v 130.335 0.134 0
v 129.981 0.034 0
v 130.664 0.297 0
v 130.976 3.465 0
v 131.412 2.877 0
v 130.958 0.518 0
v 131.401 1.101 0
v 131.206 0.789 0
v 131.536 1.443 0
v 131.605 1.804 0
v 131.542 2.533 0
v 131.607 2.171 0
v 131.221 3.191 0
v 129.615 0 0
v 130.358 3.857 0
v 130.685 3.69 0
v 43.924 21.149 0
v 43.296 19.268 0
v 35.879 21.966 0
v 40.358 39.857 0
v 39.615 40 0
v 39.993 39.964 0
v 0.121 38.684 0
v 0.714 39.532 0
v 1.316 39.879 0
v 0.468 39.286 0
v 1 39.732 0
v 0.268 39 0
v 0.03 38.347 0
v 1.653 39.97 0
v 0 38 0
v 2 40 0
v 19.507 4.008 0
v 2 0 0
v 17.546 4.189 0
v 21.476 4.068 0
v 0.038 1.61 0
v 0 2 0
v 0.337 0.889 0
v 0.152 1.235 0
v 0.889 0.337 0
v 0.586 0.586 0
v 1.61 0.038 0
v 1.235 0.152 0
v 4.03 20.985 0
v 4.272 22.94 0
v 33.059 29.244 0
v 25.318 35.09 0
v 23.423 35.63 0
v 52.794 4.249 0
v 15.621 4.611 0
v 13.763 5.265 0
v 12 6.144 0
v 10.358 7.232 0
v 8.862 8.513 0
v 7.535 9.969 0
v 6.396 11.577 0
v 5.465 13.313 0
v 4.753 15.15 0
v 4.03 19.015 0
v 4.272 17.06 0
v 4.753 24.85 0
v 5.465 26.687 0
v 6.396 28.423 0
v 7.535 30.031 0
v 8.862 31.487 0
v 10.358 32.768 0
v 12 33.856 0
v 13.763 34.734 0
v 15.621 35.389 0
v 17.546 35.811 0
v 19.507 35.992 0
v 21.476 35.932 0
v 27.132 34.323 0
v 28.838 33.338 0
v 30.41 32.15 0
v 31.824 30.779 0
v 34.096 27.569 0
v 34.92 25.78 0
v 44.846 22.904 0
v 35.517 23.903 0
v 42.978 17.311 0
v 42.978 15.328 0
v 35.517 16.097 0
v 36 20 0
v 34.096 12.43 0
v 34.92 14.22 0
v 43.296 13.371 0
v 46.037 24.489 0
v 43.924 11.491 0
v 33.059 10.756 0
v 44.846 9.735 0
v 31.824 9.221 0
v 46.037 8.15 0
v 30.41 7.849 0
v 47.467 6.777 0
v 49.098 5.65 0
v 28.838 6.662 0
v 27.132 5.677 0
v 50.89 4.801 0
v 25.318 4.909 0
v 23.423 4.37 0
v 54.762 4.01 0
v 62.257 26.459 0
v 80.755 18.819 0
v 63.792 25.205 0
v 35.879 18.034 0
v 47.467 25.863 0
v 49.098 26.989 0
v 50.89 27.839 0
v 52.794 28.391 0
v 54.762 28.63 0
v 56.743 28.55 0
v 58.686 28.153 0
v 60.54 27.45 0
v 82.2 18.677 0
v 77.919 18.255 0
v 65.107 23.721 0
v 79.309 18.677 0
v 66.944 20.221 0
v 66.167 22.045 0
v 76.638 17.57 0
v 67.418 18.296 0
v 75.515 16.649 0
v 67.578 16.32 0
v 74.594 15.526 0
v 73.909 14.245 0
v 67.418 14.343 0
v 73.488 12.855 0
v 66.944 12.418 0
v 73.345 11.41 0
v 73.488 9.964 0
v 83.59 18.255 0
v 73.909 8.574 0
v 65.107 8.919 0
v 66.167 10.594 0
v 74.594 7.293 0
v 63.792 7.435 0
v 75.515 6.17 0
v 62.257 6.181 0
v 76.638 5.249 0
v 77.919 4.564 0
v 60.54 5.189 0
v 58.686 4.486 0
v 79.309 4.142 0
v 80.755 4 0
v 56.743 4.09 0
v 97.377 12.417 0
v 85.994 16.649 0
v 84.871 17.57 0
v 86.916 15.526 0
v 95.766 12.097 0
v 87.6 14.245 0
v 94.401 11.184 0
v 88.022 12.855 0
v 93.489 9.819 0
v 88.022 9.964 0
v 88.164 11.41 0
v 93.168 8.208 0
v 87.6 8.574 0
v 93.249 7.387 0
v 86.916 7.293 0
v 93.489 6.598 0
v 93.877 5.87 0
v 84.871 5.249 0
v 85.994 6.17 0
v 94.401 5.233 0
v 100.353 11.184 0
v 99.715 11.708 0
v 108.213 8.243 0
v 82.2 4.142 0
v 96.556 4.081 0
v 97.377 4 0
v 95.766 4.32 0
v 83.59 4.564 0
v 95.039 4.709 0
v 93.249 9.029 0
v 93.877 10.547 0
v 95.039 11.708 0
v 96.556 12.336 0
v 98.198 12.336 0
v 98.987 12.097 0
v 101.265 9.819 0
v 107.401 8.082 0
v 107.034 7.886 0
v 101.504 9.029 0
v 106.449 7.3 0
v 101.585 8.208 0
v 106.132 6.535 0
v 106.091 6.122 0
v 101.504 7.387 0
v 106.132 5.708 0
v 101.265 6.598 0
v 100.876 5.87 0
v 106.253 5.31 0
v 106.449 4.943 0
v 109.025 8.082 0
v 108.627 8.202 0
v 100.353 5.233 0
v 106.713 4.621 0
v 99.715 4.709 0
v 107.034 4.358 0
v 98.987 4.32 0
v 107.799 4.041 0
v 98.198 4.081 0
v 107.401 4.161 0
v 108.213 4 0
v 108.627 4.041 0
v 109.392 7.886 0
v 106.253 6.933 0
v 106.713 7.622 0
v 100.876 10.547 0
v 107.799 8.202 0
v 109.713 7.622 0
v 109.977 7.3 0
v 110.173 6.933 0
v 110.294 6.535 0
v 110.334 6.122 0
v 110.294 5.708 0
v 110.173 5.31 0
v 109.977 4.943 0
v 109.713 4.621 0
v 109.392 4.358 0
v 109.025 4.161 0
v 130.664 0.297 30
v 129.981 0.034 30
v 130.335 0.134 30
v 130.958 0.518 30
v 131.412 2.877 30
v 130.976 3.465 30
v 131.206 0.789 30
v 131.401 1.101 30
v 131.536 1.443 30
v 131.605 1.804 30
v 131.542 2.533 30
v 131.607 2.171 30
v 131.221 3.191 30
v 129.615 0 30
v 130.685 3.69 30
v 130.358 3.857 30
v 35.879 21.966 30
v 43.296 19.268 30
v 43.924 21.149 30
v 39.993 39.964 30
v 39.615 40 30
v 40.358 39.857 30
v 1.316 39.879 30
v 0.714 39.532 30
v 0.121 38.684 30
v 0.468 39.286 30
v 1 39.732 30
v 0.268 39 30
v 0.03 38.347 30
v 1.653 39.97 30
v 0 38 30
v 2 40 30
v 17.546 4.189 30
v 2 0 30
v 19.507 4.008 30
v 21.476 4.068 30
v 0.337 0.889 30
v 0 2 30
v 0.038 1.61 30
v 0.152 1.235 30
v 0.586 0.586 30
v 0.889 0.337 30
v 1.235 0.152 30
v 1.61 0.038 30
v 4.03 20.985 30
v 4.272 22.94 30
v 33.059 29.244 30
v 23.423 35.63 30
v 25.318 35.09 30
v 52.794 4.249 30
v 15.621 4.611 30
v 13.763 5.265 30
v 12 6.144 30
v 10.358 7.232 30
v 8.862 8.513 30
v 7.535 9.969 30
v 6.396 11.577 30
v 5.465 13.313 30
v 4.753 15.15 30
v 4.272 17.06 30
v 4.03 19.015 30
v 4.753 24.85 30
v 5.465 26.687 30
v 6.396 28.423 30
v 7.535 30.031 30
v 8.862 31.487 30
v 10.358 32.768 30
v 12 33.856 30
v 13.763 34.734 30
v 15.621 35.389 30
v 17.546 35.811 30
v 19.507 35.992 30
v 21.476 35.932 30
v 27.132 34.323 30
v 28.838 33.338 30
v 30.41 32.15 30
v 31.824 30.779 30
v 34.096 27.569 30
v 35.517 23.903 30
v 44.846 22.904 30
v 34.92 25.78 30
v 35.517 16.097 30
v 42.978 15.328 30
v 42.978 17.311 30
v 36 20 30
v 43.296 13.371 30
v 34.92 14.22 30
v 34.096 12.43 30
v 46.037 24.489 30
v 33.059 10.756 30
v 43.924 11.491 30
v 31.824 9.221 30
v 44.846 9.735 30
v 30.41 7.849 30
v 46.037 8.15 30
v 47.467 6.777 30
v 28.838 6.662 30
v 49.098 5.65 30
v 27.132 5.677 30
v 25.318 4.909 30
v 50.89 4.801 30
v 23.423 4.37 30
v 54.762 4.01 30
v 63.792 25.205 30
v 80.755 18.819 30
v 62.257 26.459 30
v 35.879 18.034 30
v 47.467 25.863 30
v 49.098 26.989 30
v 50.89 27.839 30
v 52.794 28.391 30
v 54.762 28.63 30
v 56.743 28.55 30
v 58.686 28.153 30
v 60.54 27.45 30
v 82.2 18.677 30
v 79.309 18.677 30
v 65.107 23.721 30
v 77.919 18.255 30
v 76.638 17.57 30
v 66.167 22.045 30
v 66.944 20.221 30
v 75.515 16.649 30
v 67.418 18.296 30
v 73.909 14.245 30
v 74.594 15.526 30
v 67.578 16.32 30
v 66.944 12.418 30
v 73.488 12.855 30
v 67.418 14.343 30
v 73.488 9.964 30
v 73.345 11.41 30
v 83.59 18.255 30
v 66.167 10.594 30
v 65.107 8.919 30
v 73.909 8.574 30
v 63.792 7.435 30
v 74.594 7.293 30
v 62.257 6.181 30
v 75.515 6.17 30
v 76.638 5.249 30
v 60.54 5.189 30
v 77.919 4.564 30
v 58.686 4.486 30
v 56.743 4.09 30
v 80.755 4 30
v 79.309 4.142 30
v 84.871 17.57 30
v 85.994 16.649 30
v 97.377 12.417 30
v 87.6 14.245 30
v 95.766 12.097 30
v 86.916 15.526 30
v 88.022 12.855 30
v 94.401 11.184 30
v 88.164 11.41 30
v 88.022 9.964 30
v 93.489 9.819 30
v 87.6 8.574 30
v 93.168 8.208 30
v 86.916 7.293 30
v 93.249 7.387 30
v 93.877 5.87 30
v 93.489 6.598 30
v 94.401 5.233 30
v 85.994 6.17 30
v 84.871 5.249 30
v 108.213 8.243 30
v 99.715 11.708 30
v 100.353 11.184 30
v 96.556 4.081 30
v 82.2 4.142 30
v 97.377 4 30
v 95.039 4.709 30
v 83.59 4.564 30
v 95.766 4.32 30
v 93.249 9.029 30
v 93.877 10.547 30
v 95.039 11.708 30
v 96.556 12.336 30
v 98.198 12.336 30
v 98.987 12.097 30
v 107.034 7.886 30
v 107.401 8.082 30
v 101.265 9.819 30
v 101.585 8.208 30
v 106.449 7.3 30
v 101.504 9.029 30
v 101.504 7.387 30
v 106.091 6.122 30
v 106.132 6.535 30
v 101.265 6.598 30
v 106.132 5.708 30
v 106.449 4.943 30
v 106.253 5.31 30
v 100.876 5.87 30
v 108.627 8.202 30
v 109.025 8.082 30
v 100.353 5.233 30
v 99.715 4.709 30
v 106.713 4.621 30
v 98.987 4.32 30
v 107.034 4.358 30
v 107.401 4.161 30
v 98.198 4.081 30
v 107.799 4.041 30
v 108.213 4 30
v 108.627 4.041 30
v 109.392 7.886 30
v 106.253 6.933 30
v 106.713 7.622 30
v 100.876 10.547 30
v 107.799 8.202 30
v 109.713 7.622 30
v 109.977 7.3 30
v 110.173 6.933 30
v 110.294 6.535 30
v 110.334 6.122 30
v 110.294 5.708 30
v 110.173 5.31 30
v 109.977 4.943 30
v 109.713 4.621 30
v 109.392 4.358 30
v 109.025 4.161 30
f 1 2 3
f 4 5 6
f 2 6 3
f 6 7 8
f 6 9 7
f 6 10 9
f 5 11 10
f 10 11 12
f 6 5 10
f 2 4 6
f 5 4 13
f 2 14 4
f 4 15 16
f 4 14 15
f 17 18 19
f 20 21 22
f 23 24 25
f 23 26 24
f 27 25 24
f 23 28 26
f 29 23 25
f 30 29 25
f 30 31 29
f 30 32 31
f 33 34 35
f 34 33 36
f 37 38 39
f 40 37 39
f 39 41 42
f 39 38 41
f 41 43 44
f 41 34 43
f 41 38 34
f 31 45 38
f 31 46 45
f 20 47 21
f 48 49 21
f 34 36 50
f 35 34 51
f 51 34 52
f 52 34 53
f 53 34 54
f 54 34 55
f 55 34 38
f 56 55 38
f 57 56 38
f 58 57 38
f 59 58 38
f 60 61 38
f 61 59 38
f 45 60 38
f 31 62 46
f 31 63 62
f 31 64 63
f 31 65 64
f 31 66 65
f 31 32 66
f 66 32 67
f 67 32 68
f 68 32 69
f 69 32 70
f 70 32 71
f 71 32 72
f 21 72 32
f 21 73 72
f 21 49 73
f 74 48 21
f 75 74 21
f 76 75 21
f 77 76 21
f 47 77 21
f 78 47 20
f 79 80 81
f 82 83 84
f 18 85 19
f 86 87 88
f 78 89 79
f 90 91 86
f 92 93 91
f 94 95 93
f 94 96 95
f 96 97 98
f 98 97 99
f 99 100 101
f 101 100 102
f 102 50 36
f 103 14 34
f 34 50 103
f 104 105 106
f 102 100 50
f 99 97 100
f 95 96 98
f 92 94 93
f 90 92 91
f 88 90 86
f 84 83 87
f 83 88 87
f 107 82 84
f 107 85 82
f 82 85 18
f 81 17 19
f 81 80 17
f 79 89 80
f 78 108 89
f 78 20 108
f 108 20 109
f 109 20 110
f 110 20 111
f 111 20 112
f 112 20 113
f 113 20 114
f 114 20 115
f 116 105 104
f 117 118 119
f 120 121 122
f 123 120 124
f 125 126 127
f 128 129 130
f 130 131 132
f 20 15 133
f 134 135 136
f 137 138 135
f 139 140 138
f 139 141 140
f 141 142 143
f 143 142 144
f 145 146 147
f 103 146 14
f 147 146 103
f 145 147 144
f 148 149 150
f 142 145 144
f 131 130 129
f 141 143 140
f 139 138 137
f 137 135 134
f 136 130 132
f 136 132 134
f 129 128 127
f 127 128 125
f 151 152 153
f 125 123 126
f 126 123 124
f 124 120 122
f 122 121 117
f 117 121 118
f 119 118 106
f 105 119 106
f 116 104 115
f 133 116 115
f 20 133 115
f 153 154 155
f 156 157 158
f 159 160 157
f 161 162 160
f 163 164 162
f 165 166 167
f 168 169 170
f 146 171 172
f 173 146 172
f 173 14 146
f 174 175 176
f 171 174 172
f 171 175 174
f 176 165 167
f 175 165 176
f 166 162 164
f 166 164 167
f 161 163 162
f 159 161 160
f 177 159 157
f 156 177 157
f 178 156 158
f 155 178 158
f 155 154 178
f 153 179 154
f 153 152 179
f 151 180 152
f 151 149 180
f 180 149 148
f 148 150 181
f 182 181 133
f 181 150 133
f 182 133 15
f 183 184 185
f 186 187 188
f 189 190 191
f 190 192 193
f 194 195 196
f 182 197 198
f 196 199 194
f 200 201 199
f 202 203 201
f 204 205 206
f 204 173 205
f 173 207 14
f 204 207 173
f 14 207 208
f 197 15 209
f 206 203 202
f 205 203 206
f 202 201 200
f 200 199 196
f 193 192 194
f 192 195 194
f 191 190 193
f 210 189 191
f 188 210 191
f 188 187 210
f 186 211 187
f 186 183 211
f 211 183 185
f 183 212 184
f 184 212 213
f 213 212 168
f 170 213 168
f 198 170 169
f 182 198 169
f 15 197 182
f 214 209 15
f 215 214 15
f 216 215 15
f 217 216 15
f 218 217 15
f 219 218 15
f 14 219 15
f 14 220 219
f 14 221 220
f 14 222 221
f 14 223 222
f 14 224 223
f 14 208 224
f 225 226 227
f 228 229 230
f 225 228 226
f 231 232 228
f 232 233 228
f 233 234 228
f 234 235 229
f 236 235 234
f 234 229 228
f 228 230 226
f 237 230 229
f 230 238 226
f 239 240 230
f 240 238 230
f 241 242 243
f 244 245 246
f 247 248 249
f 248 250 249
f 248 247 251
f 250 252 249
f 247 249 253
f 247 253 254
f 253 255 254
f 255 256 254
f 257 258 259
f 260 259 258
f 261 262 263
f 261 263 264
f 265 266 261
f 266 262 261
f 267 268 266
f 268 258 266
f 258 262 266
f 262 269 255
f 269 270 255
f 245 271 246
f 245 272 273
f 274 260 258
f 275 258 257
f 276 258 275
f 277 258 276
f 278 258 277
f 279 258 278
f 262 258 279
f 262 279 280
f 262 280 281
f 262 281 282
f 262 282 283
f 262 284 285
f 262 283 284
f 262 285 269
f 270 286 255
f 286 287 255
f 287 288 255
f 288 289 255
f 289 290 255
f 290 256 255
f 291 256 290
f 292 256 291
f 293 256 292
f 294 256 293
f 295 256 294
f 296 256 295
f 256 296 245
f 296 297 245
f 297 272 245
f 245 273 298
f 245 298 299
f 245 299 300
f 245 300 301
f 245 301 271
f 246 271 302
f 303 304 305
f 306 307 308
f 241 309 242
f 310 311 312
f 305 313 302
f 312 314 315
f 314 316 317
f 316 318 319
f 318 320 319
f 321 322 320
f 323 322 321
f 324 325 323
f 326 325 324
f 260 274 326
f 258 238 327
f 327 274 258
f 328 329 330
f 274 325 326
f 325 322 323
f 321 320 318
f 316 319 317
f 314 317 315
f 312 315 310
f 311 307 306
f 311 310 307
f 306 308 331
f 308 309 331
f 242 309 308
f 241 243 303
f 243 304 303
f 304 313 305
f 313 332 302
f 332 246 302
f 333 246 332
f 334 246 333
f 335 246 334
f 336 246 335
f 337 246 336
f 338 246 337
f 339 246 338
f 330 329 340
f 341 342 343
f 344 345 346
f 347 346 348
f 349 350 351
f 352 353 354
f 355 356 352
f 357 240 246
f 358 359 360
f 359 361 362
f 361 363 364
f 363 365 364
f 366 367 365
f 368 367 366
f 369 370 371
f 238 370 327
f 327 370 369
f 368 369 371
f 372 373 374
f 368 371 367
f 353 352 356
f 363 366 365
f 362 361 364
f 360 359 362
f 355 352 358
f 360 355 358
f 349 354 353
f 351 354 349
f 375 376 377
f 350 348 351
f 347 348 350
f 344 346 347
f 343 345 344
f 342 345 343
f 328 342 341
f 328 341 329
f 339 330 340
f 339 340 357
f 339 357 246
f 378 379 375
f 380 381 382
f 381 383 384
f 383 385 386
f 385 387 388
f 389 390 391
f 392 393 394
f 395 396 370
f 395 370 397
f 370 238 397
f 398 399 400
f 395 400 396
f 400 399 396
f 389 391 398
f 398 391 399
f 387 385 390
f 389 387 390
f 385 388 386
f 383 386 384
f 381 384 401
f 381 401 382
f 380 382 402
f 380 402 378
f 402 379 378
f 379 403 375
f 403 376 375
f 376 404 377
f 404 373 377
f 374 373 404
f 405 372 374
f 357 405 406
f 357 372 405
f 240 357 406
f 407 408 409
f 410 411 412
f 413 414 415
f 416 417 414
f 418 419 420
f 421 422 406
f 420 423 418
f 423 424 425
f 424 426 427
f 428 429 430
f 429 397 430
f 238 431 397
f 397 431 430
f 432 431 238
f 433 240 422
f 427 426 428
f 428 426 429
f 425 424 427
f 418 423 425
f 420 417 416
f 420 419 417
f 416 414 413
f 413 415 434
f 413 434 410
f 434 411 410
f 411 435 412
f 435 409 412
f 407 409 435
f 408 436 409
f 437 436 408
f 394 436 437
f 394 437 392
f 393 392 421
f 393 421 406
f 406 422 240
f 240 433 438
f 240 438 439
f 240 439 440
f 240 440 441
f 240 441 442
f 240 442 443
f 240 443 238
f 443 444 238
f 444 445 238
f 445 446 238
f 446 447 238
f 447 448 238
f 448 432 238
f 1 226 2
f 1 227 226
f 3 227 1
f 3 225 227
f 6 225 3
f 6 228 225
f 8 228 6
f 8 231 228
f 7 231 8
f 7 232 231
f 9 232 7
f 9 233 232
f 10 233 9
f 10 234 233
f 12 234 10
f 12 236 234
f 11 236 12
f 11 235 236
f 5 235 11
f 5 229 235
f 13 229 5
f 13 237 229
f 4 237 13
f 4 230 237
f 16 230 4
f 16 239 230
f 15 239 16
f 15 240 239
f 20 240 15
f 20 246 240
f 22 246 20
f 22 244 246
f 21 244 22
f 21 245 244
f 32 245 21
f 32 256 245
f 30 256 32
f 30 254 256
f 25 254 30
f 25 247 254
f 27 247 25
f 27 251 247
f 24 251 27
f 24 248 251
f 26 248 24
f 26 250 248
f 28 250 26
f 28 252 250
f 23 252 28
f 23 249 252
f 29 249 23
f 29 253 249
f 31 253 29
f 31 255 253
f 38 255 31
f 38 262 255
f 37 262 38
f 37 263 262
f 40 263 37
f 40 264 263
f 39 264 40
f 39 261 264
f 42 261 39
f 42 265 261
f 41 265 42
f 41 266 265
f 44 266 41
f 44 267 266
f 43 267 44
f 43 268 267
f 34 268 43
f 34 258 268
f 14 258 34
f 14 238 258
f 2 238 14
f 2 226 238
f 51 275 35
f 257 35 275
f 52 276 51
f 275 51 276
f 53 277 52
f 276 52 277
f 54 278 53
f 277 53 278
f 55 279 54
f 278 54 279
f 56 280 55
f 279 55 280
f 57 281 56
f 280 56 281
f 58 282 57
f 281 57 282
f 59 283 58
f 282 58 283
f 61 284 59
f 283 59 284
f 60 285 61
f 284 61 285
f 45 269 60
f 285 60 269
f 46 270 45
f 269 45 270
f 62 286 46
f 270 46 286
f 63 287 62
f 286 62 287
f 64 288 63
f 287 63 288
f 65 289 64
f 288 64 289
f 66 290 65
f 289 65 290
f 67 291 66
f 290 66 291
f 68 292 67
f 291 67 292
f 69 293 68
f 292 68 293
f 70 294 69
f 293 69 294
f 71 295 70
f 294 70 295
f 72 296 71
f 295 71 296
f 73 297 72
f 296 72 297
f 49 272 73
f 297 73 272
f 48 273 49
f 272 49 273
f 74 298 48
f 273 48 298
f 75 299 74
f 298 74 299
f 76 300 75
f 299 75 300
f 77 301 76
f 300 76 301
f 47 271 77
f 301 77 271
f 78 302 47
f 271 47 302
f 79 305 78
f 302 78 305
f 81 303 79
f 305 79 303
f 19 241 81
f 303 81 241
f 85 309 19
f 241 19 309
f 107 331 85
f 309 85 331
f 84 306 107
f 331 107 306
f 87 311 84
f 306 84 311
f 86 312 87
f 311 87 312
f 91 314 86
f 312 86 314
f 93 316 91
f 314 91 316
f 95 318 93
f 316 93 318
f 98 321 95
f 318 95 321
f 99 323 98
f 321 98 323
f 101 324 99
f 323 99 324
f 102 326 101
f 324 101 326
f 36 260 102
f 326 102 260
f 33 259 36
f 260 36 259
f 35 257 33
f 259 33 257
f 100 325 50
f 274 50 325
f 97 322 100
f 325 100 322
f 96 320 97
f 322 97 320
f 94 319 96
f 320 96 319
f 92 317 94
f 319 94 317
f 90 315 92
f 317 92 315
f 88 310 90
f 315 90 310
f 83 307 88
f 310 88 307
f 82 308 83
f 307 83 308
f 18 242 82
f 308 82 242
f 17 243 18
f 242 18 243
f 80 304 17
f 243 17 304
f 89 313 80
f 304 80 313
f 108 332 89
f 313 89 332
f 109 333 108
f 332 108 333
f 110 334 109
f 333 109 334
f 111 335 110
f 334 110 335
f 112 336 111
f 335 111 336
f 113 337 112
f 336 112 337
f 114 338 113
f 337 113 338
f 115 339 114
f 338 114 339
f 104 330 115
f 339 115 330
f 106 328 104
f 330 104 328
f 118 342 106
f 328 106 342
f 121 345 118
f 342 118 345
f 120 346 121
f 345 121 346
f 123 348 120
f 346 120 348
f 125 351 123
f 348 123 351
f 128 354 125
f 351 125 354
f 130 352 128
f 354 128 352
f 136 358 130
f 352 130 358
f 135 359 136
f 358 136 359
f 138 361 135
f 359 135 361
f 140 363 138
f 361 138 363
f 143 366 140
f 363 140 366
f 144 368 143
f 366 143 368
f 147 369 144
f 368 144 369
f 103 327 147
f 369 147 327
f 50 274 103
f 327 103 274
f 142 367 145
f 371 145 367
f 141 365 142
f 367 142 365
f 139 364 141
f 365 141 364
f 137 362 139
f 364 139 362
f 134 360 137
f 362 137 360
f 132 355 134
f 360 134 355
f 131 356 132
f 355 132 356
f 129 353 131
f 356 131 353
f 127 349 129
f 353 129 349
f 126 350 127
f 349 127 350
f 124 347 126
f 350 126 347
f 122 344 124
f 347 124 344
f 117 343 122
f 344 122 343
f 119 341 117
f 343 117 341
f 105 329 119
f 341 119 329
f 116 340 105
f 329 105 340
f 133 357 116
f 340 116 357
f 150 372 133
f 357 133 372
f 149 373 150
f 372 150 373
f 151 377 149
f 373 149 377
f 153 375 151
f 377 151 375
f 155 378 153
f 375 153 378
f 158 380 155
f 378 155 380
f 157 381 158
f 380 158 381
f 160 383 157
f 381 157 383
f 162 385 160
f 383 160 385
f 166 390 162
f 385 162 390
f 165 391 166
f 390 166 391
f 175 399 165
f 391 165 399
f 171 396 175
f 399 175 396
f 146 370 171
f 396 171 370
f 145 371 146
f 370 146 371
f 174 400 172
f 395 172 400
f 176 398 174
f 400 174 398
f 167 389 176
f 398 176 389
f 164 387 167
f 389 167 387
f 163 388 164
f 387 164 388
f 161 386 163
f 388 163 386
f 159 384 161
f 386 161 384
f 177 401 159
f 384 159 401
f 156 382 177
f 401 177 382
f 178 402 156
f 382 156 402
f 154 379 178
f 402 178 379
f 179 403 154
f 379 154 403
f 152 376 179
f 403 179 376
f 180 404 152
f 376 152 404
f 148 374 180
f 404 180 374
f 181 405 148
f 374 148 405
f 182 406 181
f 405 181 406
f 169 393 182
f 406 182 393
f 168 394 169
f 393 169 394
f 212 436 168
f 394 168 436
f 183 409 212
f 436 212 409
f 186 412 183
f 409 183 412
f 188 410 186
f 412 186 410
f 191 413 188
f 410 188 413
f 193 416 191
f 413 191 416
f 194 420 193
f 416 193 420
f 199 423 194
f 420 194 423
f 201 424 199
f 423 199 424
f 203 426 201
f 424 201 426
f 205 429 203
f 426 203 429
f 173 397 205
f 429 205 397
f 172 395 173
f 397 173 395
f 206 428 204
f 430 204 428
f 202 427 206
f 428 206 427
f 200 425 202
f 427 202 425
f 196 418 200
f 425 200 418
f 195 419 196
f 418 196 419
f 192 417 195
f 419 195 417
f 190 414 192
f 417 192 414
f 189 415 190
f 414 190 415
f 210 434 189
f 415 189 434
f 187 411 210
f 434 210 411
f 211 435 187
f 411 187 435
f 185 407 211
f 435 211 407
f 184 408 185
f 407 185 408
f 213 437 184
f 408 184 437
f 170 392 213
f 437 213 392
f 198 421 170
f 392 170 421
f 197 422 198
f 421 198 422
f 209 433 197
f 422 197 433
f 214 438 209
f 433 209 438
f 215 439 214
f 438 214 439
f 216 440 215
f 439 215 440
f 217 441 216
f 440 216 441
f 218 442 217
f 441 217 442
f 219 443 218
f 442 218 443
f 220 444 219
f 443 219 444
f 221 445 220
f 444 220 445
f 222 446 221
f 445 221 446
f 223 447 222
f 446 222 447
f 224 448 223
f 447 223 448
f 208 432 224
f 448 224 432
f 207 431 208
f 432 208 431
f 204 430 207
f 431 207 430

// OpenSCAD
// Generated by Parametrix
ca_doorstop_faceProfile_000 = [ [ 2.0000, 0.0000 ],[ 129.6148, 0.0000 ],[ 129.9809, 0.0338 ],[ 130.3346, 0.1340 ],[ 130.6640, 0.2973 ],[ 130.9579, 0.5181 ],[ 131.2065, 0.7889 ],[ 131.4013, 1.1007 ],[ 131.5357, 1.4429 ],[ 131.6052, 1.8039 ],[ 131.6075, 2.1715 ],[ 131.5424, 2.5333 ],[ 131.4122, 2.8771 ],[ 131.2213, 3.1913 ],[ 130.9761, 3.4652 ],[ 130.6850, 3.6896 ],[ 130.3576, 3.8570 ],[ 40.3576, 39.8570 ],[ 39.9931, 39.9639 ],[ 39.6148, 40.0000 ],[ 2.0000, 40.0000 ],[ 1.6527, 39.9696 ],[ 1.3160, 39.8794 ],[ 1.0000, 39.7321 ],[ 0.7144, 39.5321 ],[ 0.4679, 39.2856 ],[ 0.2679, 39.0000 ],[ 0.1206, 38.6840 ],[ 0.0304, 38.3473 ],[ 0.0000, 38.0000 ],[ 0.0000, 2.0000 ],[ 0.0384, 1.6098 ],[ 0.1522, 1.2346 ],[ 0.3371, 0.8889 ],[ 0.5858, 0.5858 ],[ 0.8889, 0.3371 ],[ 1.2346, 0.1522 ],[ 1.6098, 0.0384 ],[ 2.0000, 0.0000 ] ];
cb_doorstop_faceProfile_000 = [  0, 1, 2, 3, 4, 5, 6, 7, 8, 9, 10, 11, 12, 13, 14, 15, 16, 17, 18, 19, 20, 21, 22, 23, 24, 25, 26, 27, 28, 29, 30, 31, 32, 33, 34, 35, 36, 37, 38 ];
ca_doorstop_faceProfile_001 = [ [ 36.0000, 20.0000 ],[ 35.8787, 21.9662 ],[ 35.5168, 23.9026 ],[ 34.9196, 25.7799 ],[ 34.0962, 27.5695 ],[ 33.0592, 29.2444 ],[ 31.8241, 30.7791 ],[ 30.4099, 32.1505 ],[ 28.8378, 33.3376 ],[ 27.1318, 34.3226 ],[ 25.3177, 35.0905 ],[ 23.4229, 35.6296 ],[ 21.4763, 35.9317 ],[ 19.5073, 35.9924 ],[ 17.5457, 35.8106 ],[ 15.6214, 35.3892 ],[ 13.7634, 34.7345 ],[ 12.0000, 33.8564 ],[ 10.3578, 32.7683 ],[ 8.8619, 31.4866 ],[ 7.5347, 30.0308 ],[ 6.3965, 28.4229 ],[ 5.4646, 26.6874 ],[ 4.7529, 24.8504 ],[ 4.2724, 22.9400 ],[ 4.0303, 20.9850 ],[ 4.0303, 19.0150 ],[ 4.2724, 17.0600 ],[ 4.7529, 15.1496 ],[ 5.4646, 13.3126 ],[ 6.3965, 11.5771 ],[ 7.5347, 9.9692 ],[ 8.8619, 8.5134 ],[ 10.3578, 7.2317 ],[ 12.0000, 6.1436 ],[ 13.7634, 5.2655 ],[ 15.6214, 4.6108 ],[ 17.5457, 4.1894 ],[ 19.5073, 4.0076 ],[ 21.4763, 4.0683 ],[ 23.4229, 4.3704 ],[ 25.3177, 4.9095 ],[ 27.1318, 5.6774 ],[ 28.8378, 6.6624 ],[ 30.4099, 7.8495 ],[ 31.8241, 9.2209 ],[ 33.0592, 10.7556 ],[ 34.0962, 12.4305 ],[ 34.9196, 14.2201 ],[ 35.5168, 16.0974 ],[ 35.8787, 18.0338 ],[ 36.0000, 20.0000 ] ];
cb_doorstop_faceProfile_001 = [  39, 40, 41, 42, 43, 44, 45, 46, 47, 48, 49, 50, 51, 52, 53, 54, 55, 56, 57, 58, 59, 60, 61, 62, 63, 64, 65, 66, 67, 68, 69, 70, 71, 72, 73, 74, 75, 76, 77, 78, 79, 80, 81, 82, 83, 84, 85, 86, 87, 88, 89, 90 ];
ca_doorstop_faceProfile_002 = [ [ 67.5780, 16.3198 ],[ 67.4185, 18.2960 ],[ 66.9440, 20.2210 ],[ 66.1669, 22.0451 ],[ 65.1072, 23.7208 ],[ 63.7924, 25.2048 ],[ 62.2567, 26.4587 ],[ 60.5396, 27.4501 ],[ 58.6858, 28.1531 ],[ 56.7432, 28.5497 ],[ 54.7622, 28.6296 ],[ 52.7940, 28.3906 ],[ 50.8896, 27.8390 ],[ 49.0984, 26.9890 ],[ 47.4667, 25.8627 ],[ 46.0368, 24.4893 ],[ 44.8457, 22.9043 ],[ 43.9243, 21.1487 ],[ 43.2965, 19.2681 ],[ 42.9784, 17.3111 ],[ 42.9784, 15.3284 ],[ 43.2965, 13.3715 ],[ 43.9243, 11.4908 ],[ 44.8457, 9.7353 ],[ 46.0368, 8.1503 ],[ 47.4667, 6.7768 ],[ 49.0984, 5.6505 ],[ 50.8896, 4.8006 ],[ 52.7940, 4.2490 ],[ 54.7622, 4.0100 ],[ 56.7432, 4.0898 ],[ 58.6858, 4.4864 ],[ 60.5396, 5.1895 ],[ 62.2567, 6.1808 ],[ 63.7924, 7.4347 ],[ 65.1072, 8.9188 ],[ 66.1669, 10.5945 ],[ 66.9440, 12.4185 ],[ 67.4185, 14.3435 ],[ 67.5780, 16.3198 ] ];
cb_doorstop_faceProfile_002 = [  91, 92, 93, 94, 95, 96, 97, 98, 99, 100, 101, 102, 103, 104, 105, 106, 107, 108, 109, 110, 111, 112, 113, 114, 115, 116, 117, 118, 119, 120, 121, 122, 123, 124, 125, 126, 127, 128, 129, 130 ];
ca_doorstop_faceProfile_003 = [ [ 88.1645, 11.4096 ],[ 88.0221, 12.8551 ],[ 87.6004, 14.2451 ],[ 86.9157, 15.5261 ],[ 85.9942, 16.6489 ],[ 84.8714, 17.5704 ],[ 83.5904, 18.2551 ],[ 82.2004, 18.6768 ],[ 80.7549, 18.8191 ],[ 79.3093, 18.6768 ],[ 77.9194, 18.2551 ],[ 76.6383, 17.5704 ],[ 75.5155, 16.6489 ],[ 74.5941, 15.5261 ],[ 73.9093, 14.2451 ],[ 73.4877, 12.8551 ],[ 73.3453, 11.4096 ],[ 73.4877, 9.9640 ],[ 73.9093, 8.5740 ],[ 74.5941, 7.2930 ],[ 75.5155, 6.1702 ],[ 76.6383, 5.2487 ],[ 77.9194, 4.5640 ],[ 79.3093, 4.1424 ],[ 80.7549, 4.0000 ],[ 82.2004, 4.1424 ],[ 83.5904, 4.5640 ],[ 84.8714, 5.2487 ],[ 85.9942, 6.1702 ],[ 86.9157, 7.2930 ],[ 87.6004, 8.5740 ],[ 88.0221, 9.9640 ],[ 88.1645, 11.4096 ] ];
cb_doorstop_faceProfile_003 = [  131, 132, 133, 134, 135, 136, 137, 138, 139, 140, 141, 142, 143, 144, 145, 146, 147, 148, 149, 150, 151, 152, 153, 154, 155, 156, 157, 158, 159, 160, 161, 162, 163 ];
ca_doorstop_faceProfile_004 = [ [ 101.5852, 8.2085 ],[ 101.5044, 9.0295 ],[ 101.2649, 9.8190 ],[ 100.8760, 10.5466 ],[ 100.3526, 11.1843 ],[ 99.7148, 11.7077 ],[ 98.9873, 12.0966 ],[ 98.1978, 12.3361 ],[ 97.3767, 12.4170 ],[ 96.5557, 12.3361 ],[ 95.7662, 12.0966 ],[ 95.0386, 11.7077 ],[ 94.4009, 11.1843 ],[ 93.8775, 10.5466 ],[ 93.4886, 9.8190 ],[ 93.2491, 9.0295 ],[ 93.1682, 8.2085 ],[ 93.2491, 7.3875 ],[ 93.4886, 6.5980 ],[ 93.8775, 5.8704 ],[ 94.4009, 5.2326 ],[ 95.0386, 4.7093 ],[ 95.7662, 4.3204 ],[ 96.5557, 4.0809 ],[ 97.3767, 4.0000 ],[ 98.1978, 4.0809 ],[ 98.9873, 4.3204 ],[ 99.7148, 4.7093 ],[ 100.3526, 5.2326 ],[ 100.8760, 5.8704 ],[ 101.2649, 6.5980 ],[ 101.5044, 7.3875 ],[ 101.5852, 8.2085 ] ];
cb_doorstop_faceProfile_004 = [  164, 165, 166, 167, 168, 169, 170, 171, 172, 173, 174, 175, 176, 177, 178, 179, 180, 181, 182, 183, 184, 185, 186, 187, 188, 189, 190, 191, 192, 193, 194, 195, 196 ];
ca_doorstop_faceProfile_005 = [ [ 110.3345, 6.1216 ],[ 110.2938, 6.5355 ],[ 110.1730, 6.9335 ],[ 109.9770, 7.3004 ],[ 109.7131, 7.6219 ],[ 109.3916, 7.8857 ],[ 109.0248, 8.0818 ],[ 108.6268, 8.2025 ],[ 108.2129, 8.2433 ],[ 107.7990, 8.2025 ],[ 107.4010, 8.0818 ],[ 107.0342, 7.8857 ],[ 106.7127, 7.6219 ],[ 106.4488, 7.3004 ],[ 106.2528, 6.9335 ],[ 106.1320, 6.5355 ],[ 106.0913, 6.1216 ],[ 106.1320, 5.7077 ],[ 106.2528, 5.3097 ],[ 106.4488, 4.9429 ],[ 106.7127, 4.6214 ],[ 107.0342, 4.3576 ],[ 107.4010, 4.1615 ],[ 107.7990, 4.0408 ],[ 108.2129, 4.0000 ],[ 108.6268, 4.0408 ],[ 109.0248, 4.1615 ],[ 109.3916, 4.3576 ],[ 109.7131, 4.6214 ],[ 109.9770, 4.9429 ],[ 110.1730, 5.3097 ],[ 110.2938, 5.7077 ],[ 110.3345, 6.1216 ] ];
cb_doorstop_faceProfile_005 = [  197, 198, 199, 200, 201, 202, 203, 204, 205, 206, 207, 208, 209, 210, 211, 212, 213, 214, 215, 216, 217, 218, 219, 220, 221, 222, 223, 224, 225, 226, 227, 228, 229 ];
a_doorstop_faceProfile = concat(ca_doorstop_faceProfile_000, ca_doorstop_faceProfile_001, ca_doorstop_faceProfile_002, ca_doorstop_faceProfile_003, ca_doorstop_faceProfile_004, ca_doorstop_faceProfile_005);
b_doorstop_faceProfile = [cb_doorstop_faceProfile_000, cb_doorstop_faceProfile_001, cb_doorstop_faceProfile_002, cb_doorstop_faceProfile_003, cb_doorstop_faceProfile_004, cb_doorstop_faceProfile_005];
ca_doorstop_faceTop_000 = [ [ 0.0000, 0.0000 ],[ 40.0000, 0.0000 ],[ 40.0000, 30.0000 ],[ 0.0000, 30.0000 ],[ 0.0000, 0.0000 ] ];
cb_doorstop_faceTop_000 = [  0, 1, 2, 3, 4 ];
ca_doorstop_faceTop_001 = [ [ 40.0000, 0.0000 ],[ 140.0000, 0.0000 ],[ 140.0000, 30.0000 ],[ 40.0000, 30.0000 ],[ 40.0000, 0.0000 ] ];
cb_doorstop_faceTop_001 = [  5, 6, 7, 8, 9 ];
a_doorstop_faceTop = concat(ca_doorstop_faceTop_000, ca_doorstop_faceTop_001);
b_doorstop_faceTop = [cb_doorstop_faceTop_000, cb_doorstop_faceTop_001];
ca_doorstop_faceSide_000 = [ [ 0.0000, 0.0000 ],[ 30.0000, 0.0000 ],[ 30.0000, 40.0000 ],[ 0.0000, 40.0000 ],[ 0.0000, 0.0000 ] ];
cb_doorstop_faceSide_000 = [  0, 1, 2, 3, 4 ];
a_doorstop_faceSide = concat(ca_doorstop_faceSide_000);
b_doorstop_faceSide = [cb_doorstop_faceSide_000];

module subpax_doorstop () {
	translate( [ 0, 0, 0 ])
		rotate( [ 0, 0, 0 ])
			   linear_extrude(height = 30) polygon(a_doorstop_faceProfile, b_doorstop_faceProfile);
}

module pax_doorstop () {
	subpax_doorstop();
}

pax_doorstop();
